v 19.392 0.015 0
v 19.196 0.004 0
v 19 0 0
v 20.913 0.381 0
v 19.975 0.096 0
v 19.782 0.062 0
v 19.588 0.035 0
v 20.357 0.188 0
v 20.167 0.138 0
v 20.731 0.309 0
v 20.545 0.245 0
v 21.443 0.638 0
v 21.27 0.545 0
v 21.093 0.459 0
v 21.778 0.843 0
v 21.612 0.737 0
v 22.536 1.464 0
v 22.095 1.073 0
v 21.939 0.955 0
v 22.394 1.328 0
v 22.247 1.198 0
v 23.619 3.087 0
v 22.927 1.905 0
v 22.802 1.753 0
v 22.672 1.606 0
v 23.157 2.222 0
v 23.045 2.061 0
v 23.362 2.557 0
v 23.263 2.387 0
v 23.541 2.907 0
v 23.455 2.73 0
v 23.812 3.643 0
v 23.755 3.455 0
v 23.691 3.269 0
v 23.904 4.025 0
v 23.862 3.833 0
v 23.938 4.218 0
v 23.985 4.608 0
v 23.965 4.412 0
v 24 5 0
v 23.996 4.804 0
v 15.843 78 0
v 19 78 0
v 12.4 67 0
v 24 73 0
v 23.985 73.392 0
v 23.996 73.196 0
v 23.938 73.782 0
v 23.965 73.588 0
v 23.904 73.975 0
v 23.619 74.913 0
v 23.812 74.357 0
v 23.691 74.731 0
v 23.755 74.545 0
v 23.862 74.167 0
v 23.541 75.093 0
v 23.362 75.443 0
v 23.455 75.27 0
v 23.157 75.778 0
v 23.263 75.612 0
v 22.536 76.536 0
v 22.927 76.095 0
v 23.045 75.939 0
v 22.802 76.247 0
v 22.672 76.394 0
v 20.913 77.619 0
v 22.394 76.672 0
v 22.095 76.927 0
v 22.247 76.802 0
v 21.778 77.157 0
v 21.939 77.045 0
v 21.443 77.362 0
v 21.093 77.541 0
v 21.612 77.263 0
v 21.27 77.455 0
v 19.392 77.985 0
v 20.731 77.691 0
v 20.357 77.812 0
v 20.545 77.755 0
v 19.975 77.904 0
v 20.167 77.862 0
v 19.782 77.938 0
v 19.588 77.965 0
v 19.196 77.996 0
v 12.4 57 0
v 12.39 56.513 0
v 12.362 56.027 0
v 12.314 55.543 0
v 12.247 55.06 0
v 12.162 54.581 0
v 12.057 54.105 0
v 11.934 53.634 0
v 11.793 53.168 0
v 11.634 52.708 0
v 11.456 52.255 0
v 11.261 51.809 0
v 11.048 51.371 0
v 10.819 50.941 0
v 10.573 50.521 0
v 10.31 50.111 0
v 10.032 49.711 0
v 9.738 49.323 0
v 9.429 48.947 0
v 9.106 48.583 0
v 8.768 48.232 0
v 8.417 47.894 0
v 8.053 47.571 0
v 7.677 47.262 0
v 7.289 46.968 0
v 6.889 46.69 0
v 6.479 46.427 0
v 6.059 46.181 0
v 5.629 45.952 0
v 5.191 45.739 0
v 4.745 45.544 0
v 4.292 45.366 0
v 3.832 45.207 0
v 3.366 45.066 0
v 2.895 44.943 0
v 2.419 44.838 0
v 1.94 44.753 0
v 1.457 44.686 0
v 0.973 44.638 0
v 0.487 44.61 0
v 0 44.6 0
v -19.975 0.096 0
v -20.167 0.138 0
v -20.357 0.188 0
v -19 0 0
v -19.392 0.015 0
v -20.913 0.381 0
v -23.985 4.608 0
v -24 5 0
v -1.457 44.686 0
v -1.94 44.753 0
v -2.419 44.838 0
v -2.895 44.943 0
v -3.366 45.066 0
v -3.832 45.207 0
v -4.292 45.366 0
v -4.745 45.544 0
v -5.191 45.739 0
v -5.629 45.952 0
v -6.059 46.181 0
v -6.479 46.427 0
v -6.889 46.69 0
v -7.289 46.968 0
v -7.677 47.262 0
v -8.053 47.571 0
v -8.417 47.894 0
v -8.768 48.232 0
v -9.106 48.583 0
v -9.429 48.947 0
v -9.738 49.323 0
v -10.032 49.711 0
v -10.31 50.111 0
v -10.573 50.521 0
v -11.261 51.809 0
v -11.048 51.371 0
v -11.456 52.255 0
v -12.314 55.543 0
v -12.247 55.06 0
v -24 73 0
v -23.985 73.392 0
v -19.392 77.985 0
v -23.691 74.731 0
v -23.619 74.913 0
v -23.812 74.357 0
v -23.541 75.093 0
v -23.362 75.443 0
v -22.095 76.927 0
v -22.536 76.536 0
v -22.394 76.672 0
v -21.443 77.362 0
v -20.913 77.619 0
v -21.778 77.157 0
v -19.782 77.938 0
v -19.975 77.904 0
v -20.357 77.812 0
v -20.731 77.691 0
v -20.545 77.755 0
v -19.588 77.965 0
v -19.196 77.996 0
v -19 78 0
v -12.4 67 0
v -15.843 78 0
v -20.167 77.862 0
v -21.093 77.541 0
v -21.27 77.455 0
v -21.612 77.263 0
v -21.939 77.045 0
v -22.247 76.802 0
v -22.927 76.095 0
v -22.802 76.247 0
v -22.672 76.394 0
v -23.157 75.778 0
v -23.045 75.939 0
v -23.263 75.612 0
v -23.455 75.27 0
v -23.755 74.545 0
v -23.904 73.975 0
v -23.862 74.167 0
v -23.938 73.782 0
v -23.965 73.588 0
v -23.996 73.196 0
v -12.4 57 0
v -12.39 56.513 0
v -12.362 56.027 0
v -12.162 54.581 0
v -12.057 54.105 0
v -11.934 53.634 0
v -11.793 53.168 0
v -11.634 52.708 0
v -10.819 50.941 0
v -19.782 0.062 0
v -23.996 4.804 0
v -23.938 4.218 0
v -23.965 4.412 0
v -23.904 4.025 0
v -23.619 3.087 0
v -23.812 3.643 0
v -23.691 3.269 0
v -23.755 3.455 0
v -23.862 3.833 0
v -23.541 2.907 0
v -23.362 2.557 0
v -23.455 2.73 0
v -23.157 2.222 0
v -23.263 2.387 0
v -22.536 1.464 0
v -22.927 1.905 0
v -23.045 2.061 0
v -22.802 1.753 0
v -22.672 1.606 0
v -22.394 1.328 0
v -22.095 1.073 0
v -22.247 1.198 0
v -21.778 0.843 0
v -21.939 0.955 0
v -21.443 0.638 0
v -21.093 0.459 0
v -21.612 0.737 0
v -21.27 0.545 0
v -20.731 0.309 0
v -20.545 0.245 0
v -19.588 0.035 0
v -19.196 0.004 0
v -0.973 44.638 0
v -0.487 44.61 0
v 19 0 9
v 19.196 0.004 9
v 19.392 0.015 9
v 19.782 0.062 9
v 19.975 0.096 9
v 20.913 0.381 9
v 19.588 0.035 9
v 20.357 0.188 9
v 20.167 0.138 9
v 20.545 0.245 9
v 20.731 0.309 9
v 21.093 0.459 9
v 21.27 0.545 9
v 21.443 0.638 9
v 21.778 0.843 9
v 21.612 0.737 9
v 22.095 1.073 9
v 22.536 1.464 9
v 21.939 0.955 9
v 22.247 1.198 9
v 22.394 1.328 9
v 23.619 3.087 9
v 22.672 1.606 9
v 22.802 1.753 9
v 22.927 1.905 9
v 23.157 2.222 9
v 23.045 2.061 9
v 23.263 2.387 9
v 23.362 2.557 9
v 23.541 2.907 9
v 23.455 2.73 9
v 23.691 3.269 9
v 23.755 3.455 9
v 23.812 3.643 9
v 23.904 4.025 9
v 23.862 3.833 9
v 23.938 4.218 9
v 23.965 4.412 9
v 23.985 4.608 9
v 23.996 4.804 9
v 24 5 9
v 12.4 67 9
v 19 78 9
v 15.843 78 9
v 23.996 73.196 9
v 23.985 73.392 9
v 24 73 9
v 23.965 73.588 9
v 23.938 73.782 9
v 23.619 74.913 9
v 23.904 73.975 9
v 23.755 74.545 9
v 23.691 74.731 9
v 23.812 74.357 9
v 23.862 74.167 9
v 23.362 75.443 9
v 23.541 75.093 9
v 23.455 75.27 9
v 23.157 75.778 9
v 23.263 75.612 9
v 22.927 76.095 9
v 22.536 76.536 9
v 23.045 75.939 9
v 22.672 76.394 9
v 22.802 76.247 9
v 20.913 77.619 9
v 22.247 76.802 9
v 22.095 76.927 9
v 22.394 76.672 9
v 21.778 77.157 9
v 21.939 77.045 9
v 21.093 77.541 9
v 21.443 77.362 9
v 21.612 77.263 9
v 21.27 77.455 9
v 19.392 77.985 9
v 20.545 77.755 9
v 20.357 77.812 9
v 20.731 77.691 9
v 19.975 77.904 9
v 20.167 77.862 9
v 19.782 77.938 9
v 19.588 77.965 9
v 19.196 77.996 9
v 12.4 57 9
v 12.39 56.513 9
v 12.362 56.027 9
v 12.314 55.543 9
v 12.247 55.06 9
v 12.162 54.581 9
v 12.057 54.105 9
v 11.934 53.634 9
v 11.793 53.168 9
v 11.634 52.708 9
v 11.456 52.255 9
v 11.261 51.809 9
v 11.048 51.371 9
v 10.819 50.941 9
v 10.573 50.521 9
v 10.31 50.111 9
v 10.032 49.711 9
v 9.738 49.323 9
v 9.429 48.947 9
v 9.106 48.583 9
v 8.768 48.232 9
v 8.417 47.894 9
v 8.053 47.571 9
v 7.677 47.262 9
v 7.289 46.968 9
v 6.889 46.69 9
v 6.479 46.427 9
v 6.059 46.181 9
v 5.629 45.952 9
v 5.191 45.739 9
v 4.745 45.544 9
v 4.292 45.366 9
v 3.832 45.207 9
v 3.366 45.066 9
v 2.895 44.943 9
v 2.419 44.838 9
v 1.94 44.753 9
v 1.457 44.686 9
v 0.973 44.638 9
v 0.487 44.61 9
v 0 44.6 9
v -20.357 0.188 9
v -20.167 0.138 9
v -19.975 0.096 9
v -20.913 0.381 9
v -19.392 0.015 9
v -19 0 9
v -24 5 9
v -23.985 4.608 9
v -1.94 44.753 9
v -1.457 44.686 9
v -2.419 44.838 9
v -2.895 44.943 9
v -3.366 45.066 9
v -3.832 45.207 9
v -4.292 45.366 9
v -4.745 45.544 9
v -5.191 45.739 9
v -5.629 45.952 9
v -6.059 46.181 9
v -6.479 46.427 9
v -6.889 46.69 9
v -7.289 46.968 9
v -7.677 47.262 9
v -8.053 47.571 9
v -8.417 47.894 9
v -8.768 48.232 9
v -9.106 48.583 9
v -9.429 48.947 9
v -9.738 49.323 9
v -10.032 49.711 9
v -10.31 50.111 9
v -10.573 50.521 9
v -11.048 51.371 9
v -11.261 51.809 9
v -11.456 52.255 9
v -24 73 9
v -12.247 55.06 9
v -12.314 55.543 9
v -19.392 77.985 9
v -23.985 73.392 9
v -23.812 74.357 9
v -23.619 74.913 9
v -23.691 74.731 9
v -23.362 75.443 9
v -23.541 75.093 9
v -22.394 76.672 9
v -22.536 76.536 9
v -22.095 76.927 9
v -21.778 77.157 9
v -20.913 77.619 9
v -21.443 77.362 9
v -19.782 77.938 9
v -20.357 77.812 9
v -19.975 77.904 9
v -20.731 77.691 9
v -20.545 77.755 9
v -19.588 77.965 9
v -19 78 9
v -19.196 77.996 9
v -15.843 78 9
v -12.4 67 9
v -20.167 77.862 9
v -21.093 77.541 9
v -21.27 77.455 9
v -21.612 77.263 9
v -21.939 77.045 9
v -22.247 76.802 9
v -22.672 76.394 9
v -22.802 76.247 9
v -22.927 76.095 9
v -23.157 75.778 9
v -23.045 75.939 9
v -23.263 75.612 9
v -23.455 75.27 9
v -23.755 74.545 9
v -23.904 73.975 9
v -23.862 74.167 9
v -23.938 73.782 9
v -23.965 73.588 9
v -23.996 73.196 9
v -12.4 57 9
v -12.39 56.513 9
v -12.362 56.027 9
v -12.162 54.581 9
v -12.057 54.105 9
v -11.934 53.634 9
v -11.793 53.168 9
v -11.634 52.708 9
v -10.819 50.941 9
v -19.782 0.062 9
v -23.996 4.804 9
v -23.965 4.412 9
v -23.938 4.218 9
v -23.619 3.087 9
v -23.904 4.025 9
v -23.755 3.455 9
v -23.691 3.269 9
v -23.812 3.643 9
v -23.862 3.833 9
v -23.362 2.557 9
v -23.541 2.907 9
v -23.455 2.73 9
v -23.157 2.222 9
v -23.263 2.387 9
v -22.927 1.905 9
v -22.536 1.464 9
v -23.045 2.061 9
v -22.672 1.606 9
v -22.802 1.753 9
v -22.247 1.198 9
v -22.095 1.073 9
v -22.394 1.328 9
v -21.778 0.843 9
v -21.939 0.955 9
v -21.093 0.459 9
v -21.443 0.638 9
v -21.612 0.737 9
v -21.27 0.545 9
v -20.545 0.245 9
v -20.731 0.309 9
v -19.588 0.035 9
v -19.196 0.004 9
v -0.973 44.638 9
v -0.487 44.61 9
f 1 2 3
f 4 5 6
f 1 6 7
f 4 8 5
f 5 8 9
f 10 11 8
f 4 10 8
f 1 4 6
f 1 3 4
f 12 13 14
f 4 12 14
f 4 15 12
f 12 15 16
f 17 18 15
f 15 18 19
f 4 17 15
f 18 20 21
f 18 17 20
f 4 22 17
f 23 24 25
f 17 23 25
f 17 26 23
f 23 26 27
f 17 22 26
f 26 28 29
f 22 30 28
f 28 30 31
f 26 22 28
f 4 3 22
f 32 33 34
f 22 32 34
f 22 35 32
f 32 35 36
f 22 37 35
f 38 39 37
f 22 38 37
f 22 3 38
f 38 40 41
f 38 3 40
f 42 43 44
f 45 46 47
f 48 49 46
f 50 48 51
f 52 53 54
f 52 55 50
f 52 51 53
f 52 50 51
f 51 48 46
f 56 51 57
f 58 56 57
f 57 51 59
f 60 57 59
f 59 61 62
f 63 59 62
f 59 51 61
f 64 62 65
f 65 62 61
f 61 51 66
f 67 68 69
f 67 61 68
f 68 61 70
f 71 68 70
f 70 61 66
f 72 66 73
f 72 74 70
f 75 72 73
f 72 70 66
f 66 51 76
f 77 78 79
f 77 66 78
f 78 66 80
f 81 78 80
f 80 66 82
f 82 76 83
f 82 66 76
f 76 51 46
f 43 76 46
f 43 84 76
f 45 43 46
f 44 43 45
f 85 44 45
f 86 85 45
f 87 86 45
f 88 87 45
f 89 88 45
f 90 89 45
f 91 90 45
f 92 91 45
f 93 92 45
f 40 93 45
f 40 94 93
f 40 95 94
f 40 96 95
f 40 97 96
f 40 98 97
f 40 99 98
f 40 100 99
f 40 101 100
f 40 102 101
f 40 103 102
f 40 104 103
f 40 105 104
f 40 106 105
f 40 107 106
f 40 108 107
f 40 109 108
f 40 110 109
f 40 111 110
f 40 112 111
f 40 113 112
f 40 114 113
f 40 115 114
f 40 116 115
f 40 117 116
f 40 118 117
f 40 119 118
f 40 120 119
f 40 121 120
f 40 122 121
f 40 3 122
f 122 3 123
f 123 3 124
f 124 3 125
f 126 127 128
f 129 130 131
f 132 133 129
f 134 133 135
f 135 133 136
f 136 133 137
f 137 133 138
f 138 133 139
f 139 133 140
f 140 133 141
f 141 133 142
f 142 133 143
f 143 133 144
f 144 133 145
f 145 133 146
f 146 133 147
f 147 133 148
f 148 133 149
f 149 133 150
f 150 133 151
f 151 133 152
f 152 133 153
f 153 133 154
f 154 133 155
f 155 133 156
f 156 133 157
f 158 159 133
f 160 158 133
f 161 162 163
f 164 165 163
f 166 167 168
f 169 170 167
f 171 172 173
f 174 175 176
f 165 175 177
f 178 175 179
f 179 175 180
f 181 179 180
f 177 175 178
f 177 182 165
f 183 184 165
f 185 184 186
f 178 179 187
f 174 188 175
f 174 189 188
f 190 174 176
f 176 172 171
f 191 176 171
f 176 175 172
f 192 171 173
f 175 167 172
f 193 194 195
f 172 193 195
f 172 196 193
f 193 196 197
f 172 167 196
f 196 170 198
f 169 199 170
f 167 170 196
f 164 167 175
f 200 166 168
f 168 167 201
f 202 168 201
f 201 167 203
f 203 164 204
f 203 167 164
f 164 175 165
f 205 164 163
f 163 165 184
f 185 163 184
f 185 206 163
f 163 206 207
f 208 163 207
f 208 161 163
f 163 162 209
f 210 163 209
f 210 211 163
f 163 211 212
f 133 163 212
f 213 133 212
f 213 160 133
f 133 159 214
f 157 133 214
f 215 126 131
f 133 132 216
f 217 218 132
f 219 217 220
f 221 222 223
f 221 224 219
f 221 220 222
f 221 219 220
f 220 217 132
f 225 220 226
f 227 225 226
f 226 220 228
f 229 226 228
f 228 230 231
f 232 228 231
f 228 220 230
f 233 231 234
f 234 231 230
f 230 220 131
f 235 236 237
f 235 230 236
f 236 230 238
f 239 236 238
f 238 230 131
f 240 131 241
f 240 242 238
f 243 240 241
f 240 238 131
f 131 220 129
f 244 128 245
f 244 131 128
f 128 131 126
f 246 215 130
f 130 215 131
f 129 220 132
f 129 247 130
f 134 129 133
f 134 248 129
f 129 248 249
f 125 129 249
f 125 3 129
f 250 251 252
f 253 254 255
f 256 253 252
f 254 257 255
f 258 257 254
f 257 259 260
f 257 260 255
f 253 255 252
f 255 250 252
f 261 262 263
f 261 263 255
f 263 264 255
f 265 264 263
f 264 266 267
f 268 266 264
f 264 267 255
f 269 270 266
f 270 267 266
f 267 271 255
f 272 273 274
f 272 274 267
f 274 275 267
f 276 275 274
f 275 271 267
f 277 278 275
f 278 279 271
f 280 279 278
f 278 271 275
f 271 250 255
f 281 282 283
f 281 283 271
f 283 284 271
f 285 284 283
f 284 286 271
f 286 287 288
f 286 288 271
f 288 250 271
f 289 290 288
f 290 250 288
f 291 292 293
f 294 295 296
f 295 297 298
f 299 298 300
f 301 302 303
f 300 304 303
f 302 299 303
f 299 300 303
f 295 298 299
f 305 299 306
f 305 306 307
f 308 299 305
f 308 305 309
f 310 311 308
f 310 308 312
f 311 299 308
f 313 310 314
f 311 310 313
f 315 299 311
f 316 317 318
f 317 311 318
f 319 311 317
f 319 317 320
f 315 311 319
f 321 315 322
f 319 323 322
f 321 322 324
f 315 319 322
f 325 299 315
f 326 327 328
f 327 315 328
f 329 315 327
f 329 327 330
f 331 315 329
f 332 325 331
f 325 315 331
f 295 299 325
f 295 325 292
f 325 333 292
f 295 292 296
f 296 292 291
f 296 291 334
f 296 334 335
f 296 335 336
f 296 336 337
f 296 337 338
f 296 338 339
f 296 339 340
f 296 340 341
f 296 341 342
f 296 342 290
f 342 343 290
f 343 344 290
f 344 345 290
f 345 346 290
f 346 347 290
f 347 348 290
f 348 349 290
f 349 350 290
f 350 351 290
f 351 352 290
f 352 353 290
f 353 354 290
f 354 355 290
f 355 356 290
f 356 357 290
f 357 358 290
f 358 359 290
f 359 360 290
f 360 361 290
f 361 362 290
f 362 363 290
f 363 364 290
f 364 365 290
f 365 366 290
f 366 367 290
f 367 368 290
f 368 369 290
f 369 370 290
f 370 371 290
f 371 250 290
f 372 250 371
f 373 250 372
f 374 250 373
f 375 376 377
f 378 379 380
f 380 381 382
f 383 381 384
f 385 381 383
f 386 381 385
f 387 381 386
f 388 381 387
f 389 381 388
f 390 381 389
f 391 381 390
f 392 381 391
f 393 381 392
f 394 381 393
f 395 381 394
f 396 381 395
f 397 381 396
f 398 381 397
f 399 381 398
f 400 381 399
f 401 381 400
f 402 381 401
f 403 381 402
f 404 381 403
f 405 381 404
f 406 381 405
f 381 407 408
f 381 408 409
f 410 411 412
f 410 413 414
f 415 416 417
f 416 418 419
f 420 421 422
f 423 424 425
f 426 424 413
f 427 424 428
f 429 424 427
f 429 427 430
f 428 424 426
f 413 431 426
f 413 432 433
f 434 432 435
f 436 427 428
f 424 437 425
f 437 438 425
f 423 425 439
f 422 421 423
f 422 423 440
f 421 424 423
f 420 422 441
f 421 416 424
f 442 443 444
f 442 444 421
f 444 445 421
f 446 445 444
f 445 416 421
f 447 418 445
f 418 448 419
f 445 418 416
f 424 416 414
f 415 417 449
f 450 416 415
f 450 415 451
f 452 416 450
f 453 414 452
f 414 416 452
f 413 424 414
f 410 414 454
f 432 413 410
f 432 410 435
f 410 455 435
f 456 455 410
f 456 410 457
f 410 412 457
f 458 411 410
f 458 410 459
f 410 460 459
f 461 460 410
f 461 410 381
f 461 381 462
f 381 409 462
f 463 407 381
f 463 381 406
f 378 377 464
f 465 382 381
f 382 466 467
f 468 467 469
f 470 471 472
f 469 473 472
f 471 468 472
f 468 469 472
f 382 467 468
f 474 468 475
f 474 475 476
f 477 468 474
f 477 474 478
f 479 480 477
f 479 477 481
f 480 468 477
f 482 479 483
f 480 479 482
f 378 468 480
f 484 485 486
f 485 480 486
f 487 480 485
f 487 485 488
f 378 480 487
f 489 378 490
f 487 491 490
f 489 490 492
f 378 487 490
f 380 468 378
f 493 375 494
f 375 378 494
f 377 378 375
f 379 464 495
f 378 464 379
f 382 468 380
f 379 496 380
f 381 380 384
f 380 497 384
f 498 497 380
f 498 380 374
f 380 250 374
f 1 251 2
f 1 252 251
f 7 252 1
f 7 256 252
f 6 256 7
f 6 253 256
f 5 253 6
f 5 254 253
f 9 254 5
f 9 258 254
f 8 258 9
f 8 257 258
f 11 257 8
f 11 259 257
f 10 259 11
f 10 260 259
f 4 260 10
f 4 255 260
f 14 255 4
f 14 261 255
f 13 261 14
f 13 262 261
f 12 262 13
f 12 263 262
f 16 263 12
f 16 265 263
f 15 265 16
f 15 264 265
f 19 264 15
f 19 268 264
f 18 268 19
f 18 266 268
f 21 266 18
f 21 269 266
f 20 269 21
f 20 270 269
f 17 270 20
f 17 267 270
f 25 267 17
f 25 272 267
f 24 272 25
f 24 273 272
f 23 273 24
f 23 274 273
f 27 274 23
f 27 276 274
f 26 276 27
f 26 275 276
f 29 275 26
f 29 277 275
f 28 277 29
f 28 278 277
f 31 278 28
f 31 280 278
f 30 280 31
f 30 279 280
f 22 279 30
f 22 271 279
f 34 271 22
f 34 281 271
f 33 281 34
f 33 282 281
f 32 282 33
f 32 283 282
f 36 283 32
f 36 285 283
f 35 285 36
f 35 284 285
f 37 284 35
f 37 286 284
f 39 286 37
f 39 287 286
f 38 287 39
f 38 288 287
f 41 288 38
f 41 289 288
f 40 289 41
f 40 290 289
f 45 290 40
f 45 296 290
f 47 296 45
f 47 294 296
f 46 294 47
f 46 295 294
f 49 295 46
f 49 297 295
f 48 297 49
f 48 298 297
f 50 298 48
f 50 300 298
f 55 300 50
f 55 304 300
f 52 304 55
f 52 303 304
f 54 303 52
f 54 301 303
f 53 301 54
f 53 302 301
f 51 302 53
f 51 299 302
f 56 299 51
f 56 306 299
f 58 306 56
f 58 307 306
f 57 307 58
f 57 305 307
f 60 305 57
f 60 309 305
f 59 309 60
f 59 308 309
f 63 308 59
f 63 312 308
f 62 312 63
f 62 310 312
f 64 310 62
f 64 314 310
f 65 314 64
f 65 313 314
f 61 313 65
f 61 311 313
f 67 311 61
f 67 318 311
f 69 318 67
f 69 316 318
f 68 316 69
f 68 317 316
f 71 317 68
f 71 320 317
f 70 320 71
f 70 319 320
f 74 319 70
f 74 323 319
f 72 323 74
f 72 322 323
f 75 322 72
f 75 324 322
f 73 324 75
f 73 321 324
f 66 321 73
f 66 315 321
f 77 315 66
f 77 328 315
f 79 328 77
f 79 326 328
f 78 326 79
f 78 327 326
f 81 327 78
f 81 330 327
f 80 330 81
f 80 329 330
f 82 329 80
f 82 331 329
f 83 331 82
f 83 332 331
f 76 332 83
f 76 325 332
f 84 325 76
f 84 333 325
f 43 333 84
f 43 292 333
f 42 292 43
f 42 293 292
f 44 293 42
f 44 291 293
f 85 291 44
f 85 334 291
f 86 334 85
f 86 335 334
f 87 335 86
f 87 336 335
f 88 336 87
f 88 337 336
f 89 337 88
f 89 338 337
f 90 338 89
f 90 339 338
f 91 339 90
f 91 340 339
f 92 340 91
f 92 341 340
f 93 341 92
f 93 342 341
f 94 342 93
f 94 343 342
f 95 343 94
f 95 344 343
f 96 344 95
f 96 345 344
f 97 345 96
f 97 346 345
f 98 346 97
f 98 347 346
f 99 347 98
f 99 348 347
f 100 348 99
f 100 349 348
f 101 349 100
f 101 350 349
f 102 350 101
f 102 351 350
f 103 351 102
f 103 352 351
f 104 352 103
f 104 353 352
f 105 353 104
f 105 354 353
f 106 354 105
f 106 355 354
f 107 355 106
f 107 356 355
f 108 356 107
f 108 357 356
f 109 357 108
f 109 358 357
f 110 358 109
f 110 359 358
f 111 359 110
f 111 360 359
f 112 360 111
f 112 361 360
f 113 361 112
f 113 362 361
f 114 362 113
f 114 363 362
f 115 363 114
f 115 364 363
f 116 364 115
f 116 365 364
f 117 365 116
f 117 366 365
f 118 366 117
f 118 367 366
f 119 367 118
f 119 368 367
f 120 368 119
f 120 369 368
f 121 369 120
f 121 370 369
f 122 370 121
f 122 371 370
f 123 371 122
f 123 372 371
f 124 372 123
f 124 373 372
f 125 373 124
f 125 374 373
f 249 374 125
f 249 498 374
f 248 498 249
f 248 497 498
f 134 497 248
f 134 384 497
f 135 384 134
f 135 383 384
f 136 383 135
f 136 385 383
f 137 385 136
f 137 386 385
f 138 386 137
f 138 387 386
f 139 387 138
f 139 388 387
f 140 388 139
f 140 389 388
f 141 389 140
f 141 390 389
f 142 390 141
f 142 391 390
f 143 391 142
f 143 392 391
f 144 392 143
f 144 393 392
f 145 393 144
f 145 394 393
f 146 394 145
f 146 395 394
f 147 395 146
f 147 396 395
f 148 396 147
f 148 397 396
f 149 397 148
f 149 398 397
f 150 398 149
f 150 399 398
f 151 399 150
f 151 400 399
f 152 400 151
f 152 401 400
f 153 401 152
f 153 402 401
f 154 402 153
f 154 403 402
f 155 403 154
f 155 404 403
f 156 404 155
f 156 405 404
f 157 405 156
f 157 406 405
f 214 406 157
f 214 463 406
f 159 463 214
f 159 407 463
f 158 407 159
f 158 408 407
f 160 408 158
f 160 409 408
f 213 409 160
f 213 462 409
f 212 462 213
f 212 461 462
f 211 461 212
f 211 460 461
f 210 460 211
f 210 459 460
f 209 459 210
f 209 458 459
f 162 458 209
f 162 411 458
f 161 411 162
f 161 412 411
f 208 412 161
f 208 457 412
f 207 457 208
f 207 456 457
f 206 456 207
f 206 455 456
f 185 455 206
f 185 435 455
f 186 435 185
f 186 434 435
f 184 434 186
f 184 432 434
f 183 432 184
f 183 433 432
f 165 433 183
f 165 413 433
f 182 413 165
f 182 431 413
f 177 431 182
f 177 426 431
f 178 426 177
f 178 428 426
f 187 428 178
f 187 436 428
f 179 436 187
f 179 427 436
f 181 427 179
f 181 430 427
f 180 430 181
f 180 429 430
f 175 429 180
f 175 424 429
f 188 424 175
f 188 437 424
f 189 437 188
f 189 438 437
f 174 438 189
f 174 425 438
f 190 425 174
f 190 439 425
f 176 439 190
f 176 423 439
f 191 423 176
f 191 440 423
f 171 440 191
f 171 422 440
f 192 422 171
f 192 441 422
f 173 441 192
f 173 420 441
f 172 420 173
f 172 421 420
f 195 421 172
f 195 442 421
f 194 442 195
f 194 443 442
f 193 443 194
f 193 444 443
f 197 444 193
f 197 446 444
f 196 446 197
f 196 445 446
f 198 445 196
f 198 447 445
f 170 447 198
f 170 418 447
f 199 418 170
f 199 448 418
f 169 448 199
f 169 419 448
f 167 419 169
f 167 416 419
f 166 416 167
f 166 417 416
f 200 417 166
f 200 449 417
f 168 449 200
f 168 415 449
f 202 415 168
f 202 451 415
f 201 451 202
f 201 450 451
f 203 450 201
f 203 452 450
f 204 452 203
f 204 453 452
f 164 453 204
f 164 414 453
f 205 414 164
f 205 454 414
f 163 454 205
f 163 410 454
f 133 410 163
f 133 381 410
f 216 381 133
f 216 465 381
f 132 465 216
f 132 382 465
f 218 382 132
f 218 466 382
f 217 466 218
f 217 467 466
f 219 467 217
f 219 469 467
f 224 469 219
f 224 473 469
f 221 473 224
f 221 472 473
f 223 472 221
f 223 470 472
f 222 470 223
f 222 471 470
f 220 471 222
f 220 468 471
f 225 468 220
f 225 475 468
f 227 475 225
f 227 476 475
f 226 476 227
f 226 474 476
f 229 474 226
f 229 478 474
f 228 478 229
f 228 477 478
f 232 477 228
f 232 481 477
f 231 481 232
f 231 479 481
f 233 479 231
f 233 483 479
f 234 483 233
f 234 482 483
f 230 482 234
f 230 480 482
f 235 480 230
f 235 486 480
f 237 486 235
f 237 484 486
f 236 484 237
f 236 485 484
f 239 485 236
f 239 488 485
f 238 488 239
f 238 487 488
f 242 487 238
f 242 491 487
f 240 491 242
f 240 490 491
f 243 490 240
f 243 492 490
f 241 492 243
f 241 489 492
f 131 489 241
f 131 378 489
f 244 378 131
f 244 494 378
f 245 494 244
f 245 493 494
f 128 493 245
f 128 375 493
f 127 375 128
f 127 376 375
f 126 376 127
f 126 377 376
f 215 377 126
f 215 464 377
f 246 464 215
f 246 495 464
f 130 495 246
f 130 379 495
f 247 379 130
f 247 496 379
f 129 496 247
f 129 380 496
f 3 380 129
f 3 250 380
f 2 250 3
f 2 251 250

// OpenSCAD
/*
  Schmaler, wandgeklebter Drybox-Stangenhalter
  für Aluminiumrohr Außendurchmesser 23.5 mm.
  Identisches Teil zweimal drucken.

  Die große flache Rückseite wird an die beiden gegenüberliegenden
  Innenwände der Box geklebt. Die Aufnahme ist nach oben offen, sodass
  das Rohr mitsamt Rollen herausgehoben werden kann.
*/
$fn = 160;

rohr_d = 23.5;
aufnahme_d = 24.8;       // 1,3 mm Gesamtspiel
platte_b = 48.0;
platte_h = 78.0;
platte_t = 9.0;
ecken_r = 5.0;
aufnahme_y = 57.0;
trichter_start_y = 67.0;
trichter_oben_b = 32.0;

module rounded_rect_2d(w,h,r) {
  hull() {
    for (x=[-1,1], y=[0,1])
      translate([x*(w/2-r), r+y*(h-2*r)]) circle(r=r);
  }
}

module wandhalter() {
  linear_extrude(height=platte_t)
  difference() {
    rounded_rect_2d(platte_b, platte_h, ecken_r);
    translate([0,aufnahme_y]) circle(d=aufnahme_d);
    translate([-aufnahme_d/2,aufnahme_y])
      square([aufnahme_d,trichter_start_y-aufnahme_y+0.1]);
    polygon(points=[
      [-aufnahme_d/2,trichter_start_y],
      [ aufnahme_d/2,trichter_start_y],
      [ trichter_oben_b/2,platte_h+0.5],
      [-trichter_oben_b/2,platte_h+0.5]
    ]);
  }
}

wandhalter();
